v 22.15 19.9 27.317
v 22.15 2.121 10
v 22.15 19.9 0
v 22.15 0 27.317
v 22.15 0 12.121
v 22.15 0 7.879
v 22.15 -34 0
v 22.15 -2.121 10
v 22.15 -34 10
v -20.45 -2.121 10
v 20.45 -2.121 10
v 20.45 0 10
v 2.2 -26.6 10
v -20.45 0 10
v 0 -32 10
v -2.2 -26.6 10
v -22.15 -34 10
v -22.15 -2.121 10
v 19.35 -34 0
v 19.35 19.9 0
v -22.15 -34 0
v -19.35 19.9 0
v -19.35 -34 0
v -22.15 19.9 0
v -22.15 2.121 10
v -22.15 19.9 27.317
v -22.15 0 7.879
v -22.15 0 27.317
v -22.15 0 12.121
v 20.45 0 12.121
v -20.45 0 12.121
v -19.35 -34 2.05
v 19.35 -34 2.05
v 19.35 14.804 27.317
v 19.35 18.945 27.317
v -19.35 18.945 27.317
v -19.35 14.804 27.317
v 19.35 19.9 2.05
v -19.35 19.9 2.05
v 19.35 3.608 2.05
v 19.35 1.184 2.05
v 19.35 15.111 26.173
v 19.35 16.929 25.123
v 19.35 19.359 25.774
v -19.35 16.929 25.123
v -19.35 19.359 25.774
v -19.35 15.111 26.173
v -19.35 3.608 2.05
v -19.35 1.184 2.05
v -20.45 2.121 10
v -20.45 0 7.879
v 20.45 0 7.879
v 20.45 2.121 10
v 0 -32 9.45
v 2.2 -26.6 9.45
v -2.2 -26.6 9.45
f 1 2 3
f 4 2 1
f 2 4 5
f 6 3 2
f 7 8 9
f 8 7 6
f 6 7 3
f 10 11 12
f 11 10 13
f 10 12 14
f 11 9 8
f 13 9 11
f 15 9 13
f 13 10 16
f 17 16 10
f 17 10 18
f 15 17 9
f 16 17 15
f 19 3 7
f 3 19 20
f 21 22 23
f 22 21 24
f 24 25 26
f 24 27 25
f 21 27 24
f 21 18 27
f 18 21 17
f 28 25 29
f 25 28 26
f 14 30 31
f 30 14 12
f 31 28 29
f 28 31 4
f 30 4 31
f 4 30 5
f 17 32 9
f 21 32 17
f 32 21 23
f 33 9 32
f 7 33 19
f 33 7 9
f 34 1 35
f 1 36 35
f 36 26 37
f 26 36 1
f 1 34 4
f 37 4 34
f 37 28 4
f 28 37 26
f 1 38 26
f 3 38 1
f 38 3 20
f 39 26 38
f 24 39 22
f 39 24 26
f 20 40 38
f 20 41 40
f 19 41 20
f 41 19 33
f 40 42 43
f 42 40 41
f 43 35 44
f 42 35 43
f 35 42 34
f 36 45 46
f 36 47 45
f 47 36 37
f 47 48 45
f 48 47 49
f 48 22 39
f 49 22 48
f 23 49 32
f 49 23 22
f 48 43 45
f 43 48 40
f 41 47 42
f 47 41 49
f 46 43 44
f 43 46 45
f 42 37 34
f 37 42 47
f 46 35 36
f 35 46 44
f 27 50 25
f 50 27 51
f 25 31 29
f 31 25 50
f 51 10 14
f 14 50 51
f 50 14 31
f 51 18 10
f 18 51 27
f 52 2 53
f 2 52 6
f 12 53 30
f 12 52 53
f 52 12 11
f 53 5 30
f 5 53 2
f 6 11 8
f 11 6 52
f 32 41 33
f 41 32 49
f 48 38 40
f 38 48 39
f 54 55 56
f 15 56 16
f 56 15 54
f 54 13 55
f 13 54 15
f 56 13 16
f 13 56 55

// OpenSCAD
// =============================================================================
// focus_sled.scad — two NVIDIA PCB rulers: rail + tilted target
// =============================================================================
// Flat ruler on the table, toward the lens (−Y). Sled slides on it = distance.
// Second ruler drops into the slot and leans 30° away from the lens.
// Only a thin band is sharp; the ticks tell you which way to slide.
// Side V-notches read the rail at the closest (bottom) face of the target.
//
// NVIDIA ruler ≈ 1.5" × 1.6 mm FR4. Edit RAIL_W / RAIL_T if yours differs.
// Print on the LEFT side (large flat X face) so the tilt is walls, no support.
// =============================================================================

/* [Ruler] */
RAIL_W = 38.2;
RAIL_T = 1.60;
SLIDE  = 0.50;

/* [Sled] */
TILT   = 30;
GRAB   = 26;
WALL   = 2.8;
BASE_L = 34;
BASE_H = 10;

/* [View] */
SHOW_RULERS = 1; // [0:hide, 1:show]

$fn = 48;

slot_w = RAIL_W + SLIDE;
slot_t = RAIL_T + SLIDE;
base_w = slot_w + 2 * WALL;
hold_y = GRAB * sin(TILT) + slot_t + WALL + 2;
hold_z = GRAB * cos(TILT) + WALL + 2;

// y=0 is the front face of the target (closest to the lens). −Y = lens.

module rail_groove() {
    translate([0, hold_y / 2 - BASE_L / 2, slot_t / 2 - 0.05])
        cube([slot_w, BASE_L + hold_y + 2, slot_t], center = true);
}

module target_pocket() {
    // Floor at z≈2 in the tilted frame so the ruler sits on plastic.
    rotate([-TILT, 0, 0]) {
        translate([0, slot_t / 2, 2 + (GRAB + 12) / 2])
            cube([slot_w, slot_t, GRAB + 12], center = true);
        // Lead-in on the top mouth.
        translate([0, slot_t / 2, GRAB + 6])
            rotate([45, 0, 0])
                cube([slot_w, 4, 4], center = true);
    }
}

module pointer_notches() {
    s = 3.0;
    for (x = [-1, 1])
        translate([x * (base_w / 2), 0, BASE_H])
            rotate([45, 0, 0])
                cube([WALL + 0.6, s, s], center = true);
}

module lens_arrow() {
    t = 0.55;
    translate([0, -BASE_L + 6, BASE_H - t])
        linear_extrude(t + 0.15)
            polygon([[0, -4.0], [-2.2, 1.4], [2.2, 1.4]]);
}

module body() {
    union() {
        translate([0, -BASE_L / 2, BASE_H / 2])
            cube([base_w, BASE_L, BASE_H], center = true);
        translate([0, hold_y / 2, hold_z / 2])
            cube([base_w, hold_y, hold_z], center = true);
        // Front lip so the target cannot slide toward the lens.
        translate([0, -WALL / 2, 5])
            cube([base_w, WALL, 10], center = true);
    }
}

module sled() {
    difference() {
        body();
        rail_groove();
        target_pocket();
        pointer_notches();
        lens_arrow();
    }
}

module ghost_rail() {
    color("ForestGreen", 0.4)
        translate([0, 30, RAIL_T / 2])
            cube([RAIL_W, 220, RAIL_T], center = true);
}

module ghost_target() {
    color("Gold", 0.55)
        rotate([-TILT, 0, 0])
            translate([0, RAIL_T / 2, 80])
                cube([RAIL_W, RAIL_T, 160], center = true);
}

sled();
if ($preview && SHOW_RULERS) {
    ghost_rail();
    ghost_target();
}
